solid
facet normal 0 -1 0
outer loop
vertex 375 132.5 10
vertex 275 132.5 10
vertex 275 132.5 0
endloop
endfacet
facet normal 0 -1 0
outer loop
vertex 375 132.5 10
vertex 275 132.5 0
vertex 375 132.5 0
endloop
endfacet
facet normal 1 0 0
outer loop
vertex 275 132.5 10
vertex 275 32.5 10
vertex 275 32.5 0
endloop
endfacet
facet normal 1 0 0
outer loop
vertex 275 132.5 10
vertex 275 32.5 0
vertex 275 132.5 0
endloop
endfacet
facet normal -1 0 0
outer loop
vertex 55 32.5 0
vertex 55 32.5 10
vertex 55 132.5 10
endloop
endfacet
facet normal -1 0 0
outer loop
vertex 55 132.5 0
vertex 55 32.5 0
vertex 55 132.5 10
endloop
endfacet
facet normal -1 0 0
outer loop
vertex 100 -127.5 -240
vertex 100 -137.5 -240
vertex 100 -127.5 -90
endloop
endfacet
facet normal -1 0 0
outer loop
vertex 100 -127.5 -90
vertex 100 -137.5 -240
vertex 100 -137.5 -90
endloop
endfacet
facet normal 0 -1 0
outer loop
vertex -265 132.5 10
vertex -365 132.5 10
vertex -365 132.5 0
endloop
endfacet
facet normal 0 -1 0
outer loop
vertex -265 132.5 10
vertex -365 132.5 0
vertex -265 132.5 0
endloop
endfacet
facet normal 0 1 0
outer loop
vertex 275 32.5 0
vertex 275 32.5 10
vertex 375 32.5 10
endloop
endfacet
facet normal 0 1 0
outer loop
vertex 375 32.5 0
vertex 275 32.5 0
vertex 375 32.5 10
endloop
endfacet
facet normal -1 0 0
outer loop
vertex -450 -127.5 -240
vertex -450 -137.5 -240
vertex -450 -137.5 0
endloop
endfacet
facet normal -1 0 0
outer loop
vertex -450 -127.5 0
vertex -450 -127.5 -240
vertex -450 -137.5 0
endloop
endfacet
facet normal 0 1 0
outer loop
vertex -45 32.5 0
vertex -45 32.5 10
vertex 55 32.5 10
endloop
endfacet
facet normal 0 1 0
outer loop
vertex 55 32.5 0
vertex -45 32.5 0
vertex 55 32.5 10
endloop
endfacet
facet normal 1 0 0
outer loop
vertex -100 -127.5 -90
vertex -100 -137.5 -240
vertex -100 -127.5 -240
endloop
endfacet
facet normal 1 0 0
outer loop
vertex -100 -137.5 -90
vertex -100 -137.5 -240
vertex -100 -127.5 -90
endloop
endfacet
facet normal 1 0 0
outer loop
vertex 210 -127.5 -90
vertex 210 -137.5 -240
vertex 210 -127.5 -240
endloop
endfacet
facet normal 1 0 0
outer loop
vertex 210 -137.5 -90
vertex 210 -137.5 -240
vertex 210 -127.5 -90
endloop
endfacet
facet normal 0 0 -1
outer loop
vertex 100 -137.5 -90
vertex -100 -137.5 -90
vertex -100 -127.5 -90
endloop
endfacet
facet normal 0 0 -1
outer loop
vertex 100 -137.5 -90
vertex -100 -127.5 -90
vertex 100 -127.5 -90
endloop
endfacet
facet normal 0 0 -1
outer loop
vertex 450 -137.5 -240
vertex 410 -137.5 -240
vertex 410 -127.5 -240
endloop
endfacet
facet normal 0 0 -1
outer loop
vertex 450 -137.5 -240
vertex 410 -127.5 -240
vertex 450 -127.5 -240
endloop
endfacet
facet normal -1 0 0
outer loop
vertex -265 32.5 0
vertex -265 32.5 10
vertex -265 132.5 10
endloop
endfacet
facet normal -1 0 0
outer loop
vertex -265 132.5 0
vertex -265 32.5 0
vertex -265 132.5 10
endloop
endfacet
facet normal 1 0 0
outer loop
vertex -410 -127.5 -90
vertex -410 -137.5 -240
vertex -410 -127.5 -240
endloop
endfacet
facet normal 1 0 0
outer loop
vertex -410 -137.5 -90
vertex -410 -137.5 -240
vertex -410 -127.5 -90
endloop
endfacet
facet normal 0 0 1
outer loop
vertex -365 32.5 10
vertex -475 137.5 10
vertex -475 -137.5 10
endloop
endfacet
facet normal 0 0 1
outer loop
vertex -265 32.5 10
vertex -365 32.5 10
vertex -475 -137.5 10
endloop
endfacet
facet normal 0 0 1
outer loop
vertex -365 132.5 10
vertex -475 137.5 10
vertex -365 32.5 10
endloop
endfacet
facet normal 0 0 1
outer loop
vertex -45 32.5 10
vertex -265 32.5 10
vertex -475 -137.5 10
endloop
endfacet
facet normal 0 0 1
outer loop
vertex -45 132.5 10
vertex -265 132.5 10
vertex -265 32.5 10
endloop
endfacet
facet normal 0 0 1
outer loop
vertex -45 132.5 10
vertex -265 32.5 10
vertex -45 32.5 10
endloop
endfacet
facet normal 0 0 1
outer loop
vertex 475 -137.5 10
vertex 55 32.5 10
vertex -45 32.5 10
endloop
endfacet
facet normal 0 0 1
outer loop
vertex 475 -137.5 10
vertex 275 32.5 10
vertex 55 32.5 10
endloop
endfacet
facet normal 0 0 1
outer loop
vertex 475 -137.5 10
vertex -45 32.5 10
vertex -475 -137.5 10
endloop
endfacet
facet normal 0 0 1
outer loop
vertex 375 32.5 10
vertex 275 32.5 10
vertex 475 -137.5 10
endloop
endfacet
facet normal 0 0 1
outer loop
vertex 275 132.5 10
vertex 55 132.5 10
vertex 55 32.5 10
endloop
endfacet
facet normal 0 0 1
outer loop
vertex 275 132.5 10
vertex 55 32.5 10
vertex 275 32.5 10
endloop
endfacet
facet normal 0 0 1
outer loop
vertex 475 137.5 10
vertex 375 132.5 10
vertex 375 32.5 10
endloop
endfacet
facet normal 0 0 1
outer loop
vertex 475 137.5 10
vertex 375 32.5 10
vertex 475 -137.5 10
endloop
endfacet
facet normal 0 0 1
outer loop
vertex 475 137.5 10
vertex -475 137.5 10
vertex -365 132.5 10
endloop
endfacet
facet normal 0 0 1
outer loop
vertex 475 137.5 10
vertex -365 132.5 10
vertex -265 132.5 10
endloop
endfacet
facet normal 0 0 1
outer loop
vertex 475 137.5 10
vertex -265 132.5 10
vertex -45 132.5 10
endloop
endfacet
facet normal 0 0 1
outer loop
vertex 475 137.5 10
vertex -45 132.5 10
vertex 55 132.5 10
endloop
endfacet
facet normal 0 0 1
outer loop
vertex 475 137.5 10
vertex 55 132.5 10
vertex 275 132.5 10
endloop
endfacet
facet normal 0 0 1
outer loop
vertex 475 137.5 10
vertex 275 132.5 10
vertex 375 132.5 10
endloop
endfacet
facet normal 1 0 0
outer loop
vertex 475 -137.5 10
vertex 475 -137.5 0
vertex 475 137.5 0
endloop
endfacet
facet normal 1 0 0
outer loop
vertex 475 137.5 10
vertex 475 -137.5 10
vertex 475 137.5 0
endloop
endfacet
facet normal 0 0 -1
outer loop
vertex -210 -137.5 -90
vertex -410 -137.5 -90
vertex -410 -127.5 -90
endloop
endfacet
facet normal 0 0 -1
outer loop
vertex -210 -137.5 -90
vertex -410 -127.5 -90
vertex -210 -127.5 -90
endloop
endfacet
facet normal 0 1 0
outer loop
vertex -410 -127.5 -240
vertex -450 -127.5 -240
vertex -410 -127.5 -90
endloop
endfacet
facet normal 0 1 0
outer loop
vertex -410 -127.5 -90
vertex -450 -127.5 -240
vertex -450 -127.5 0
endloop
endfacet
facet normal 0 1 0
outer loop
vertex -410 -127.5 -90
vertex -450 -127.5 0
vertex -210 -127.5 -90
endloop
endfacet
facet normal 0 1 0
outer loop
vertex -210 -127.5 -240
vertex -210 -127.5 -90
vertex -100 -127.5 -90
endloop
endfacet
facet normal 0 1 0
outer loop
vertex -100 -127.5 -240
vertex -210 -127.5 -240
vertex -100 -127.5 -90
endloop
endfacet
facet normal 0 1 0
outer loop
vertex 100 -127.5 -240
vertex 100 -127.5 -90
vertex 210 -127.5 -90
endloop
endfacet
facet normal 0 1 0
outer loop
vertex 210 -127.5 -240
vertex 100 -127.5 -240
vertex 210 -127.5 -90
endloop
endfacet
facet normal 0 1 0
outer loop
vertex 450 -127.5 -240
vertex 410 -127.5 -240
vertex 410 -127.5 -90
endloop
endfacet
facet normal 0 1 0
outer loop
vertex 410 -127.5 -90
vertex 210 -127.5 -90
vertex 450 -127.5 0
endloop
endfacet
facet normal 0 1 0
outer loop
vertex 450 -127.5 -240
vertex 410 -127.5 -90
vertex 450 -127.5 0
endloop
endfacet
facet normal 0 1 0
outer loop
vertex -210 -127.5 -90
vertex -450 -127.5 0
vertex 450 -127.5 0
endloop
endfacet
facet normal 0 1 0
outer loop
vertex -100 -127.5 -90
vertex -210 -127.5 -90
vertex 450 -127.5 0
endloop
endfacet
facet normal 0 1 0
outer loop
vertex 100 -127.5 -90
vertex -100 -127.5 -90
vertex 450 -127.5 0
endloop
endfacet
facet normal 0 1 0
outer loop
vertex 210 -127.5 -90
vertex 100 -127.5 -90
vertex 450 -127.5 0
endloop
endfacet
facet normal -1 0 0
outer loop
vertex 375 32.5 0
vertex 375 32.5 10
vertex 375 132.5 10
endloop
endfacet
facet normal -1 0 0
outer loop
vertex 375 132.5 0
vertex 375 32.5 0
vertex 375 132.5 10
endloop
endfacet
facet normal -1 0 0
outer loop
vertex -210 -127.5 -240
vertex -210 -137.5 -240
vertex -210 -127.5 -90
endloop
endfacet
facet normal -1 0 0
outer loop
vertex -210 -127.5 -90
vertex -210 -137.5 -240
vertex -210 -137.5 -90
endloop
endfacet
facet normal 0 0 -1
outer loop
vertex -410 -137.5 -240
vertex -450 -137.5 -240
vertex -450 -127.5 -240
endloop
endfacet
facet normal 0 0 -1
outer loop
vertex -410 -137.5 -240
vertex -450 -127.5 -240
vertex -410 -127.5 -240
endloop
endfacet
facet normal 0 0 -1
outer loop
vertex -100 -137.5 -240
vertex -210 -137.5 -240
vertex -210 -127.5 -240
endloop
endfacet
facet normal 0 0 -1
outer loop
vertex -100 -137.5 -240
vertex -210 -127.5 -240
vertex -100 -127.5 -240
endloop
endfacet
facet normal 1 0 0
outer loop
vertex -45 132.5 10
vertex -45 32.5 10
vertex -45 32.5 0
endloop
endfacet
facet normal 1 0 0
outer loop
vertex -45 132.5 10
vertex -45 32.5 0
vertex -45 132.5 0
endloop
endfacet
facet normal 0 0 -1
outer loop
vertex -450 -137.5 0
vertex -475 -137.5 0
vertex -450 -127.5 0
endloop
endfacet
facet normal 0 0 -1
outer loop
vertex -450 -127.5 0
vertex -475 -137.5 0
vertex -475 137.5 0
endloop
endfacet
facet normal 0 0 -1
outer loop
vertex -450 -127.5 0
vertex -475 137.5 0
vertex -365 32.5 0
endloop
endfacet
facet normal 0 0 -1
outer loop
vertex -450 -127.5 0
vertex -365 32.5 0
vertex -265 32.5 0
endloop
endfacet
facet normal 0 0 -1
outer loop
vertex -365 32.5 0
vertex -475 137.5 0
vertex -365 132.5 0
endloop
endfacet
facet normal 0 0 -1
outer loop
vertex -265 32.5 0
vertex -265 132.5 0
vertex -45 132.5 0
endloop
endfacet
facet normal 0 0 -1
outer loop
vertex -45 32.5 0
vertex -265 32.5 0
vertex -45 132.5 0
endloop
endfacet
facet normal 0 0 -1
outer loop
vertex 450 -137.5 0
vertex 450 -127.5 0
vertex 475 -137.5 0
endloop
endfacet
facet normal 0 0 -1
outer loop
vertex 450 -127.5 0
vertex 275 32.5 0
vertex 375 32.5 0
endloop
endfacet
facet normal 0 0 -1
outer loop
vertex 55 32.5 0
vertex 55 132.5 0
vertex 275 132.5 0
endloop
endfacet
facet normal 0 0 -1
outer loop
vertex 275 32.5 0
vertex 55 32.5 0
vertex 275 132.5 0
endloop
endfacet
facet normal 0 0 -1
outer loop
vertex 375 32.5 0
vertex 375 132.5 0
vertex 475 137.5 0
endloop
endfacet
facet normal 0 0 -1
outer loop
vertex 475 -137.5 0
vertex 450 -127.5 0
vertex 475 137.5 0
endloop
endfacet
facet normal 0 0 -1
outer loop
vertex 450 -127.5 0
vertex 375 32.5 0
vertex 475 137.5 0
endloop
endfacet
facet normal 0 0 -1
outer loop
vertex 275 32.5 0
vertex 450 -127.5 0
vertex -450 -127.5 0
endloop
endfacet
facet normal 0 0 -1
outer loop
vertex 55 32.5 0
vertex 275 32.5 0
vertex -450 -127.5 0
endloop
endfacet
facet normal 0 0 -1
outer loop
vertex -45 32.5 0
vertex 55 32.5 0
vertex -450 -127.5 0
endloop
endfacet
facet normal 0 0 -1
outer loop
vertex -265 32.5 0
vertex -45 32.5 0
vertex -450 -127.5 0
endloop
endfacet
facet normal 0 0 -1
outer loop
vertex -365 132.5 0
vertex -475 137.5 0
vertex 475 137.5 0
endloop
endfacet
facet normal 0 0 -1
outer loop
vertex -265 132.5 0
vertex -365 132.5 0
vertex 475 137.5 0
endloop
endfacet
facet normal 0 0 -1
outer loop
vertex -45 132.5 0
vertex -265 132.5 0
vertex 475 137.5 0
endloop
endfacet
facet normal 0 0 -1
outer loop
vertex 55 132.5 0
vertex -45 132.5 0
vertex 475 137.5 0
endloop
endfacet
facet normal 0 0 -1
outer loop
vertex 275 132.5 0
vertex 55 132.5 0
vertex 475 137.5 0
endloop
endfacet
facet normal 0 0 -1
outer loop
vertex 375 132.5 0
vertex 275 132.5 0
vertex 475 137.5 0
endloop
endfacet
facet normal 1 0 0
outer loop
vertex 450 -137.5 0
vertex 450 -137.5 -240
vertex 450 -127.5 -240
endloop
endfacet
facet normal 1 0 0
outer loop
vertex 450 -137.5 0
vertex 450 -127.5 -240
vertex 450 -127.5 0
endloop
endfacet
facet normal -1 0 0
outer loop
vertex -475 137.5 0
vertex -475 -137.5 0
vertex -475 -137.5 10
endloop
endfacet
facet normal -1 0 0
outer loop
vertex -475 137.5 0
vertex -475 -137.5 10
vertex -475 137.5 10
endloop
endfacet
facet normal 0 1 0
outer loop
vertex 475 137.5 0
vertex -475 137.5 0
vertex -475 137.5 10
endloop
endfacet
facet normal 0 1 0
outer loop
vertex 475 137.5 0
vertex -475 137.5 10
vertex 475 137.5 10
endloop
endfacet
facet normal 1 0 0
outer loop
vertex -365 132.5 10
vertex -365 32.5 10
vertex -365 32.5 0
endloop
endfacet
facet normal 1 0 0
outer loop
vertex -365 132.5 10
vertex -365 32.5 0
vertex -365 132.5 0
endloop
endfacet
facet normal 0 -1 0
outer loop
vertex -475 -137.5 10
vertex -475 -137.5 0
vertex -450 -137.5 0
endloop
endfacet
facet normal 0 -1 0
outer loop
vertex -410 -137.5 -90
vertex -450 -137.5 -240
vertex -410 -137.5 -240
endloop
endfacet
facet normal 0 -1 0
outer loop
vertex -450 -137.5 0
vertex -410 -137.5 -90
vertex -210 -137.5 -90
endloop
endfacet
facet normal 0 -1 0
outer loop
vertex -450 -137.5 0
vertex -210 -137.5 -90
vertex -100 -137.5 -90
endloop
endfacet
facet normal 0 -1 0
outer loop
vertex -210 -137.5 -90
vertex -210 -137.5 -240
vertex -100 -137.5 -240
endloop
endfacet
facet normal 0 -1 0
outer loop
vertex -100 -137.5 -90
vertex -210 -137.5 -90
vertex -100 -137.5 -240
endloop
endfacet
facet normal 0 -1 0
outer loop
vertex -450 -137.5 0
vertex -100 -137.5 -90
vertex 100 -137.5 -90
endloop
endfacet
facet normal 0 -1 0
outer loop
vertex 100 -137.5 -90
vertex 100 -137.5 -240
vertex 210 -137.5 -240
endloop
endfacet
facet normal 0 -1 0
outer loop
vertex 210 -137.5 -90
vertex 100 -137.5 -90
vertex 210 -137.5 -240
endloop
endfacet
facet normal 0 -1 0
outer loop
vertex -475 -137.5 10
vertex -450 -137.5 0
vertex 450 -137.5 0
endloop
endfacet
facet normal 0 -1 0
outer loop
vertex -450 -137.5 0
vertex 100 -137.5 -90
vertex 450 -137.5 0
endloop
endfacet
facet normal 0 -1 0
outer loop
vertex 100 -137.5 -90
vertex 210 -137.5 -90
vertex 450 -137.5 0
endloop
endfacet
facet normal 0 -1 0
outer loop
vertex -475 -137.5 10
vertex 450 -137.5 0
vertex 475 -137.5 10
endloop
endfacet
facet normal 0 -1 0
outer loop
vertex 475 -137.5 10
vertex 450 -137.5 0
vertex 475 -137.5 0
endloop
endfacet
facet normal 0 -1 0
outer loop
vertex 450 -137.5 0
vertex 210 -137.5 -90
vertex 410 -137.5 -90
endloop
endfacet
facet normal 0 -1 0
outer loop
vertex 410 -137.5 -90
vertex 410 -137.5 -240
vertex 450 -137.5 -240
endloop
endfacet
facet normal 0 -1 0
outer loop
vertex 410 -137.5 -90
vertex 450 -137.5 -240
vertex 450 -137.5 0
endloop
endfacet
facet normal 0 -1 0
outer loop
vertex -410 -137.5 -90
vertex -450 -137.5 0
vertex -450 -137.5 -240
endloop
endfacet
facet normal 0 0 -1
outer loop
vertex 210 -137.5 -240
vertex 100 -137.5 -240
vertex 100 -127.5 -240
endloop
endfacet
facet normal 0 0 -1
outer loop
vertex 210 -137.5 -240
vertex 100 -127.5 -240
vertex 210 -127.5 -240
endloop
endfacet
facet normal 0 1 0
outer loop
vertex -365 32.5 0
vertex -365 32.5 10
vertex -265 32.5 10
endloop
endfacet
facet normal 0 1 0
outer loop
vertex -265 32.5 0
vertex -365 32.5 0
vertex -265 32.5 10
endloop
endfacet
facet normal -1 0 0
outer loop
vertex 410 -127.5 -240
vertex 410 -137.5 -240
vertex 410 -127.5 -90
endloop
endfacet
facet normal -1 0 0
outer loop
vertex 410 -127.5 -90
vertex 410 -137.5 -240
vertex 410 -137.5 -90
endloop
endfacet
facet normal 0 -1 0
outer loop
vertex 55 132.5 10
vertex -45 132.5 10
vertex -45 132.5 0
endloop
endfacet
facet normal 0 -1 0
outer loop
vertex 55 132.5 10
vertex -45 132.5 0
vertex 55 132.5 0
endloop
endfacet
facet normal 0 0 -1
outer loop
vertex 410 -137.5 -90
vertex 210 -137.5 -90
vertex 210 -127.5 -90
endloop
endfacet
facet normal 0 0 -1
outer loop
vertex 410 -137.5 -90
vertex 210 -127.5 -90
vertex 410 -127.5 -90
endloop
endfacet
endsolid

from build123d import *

# Parameters (mm, degrees)
F0_W     = 950
F0_H     = 275
F1_DEPTH = 10
F2_W     = 900
F2_H     = 240
F3_DEPTH = 10
F4_W     = 200
F4_H     = 150
F5_DEPTH = 10
F6_W     = 100
F6_H     = 100
F7_DEPTH = 10


with BuildPart() as f1:
    # F0 (on Top) → F1 (new body)
    with BuildSketch(Plane.XY):
        Rectangle(F0_W, F0_H)
    extrude(amount=F1_DEPTH)

    # F2 (on face) → F3 (join)
    with BuildSketch(Plane.XZ.offset(137.5)):
        with Locations((0, -120)):
            Rectangle(F2_W, F2_H)
    extrude(amount=-F3_DEPTH)

    # F4 (on face) → F5 (cut)
    with BuildSketch(Plane.XZ.offset(137.5)):
        with Locations((-310, -165)):
            Rectangle(F4_W, F4_H)
        with Locations((0, -165)):
            Rectangle(F4_W, F4_H)
        with Locations((310, -165)):
            Rectangle(F4_W, F4_H)
    extrude(amount=-F5_DEPTH, mode=Mode.SUBTRACT)

    # F6 (on face) → F7 (cut)
    with BuildSketch(Plane.XY.offset(10)):
        with Locations((-315, 82.5)):
            Rectangle(F6_W, F6_H)
        with Locations((5, 82.5)):
            Rectangle(F6_W, F6_H)
        with Locations((325, 82.5)):
            Rectangle(F6_W, F6_H)
    extrude(amount=-F7_DEPTH, mode=Mode.SUBTRACT)


solid = f1.part
